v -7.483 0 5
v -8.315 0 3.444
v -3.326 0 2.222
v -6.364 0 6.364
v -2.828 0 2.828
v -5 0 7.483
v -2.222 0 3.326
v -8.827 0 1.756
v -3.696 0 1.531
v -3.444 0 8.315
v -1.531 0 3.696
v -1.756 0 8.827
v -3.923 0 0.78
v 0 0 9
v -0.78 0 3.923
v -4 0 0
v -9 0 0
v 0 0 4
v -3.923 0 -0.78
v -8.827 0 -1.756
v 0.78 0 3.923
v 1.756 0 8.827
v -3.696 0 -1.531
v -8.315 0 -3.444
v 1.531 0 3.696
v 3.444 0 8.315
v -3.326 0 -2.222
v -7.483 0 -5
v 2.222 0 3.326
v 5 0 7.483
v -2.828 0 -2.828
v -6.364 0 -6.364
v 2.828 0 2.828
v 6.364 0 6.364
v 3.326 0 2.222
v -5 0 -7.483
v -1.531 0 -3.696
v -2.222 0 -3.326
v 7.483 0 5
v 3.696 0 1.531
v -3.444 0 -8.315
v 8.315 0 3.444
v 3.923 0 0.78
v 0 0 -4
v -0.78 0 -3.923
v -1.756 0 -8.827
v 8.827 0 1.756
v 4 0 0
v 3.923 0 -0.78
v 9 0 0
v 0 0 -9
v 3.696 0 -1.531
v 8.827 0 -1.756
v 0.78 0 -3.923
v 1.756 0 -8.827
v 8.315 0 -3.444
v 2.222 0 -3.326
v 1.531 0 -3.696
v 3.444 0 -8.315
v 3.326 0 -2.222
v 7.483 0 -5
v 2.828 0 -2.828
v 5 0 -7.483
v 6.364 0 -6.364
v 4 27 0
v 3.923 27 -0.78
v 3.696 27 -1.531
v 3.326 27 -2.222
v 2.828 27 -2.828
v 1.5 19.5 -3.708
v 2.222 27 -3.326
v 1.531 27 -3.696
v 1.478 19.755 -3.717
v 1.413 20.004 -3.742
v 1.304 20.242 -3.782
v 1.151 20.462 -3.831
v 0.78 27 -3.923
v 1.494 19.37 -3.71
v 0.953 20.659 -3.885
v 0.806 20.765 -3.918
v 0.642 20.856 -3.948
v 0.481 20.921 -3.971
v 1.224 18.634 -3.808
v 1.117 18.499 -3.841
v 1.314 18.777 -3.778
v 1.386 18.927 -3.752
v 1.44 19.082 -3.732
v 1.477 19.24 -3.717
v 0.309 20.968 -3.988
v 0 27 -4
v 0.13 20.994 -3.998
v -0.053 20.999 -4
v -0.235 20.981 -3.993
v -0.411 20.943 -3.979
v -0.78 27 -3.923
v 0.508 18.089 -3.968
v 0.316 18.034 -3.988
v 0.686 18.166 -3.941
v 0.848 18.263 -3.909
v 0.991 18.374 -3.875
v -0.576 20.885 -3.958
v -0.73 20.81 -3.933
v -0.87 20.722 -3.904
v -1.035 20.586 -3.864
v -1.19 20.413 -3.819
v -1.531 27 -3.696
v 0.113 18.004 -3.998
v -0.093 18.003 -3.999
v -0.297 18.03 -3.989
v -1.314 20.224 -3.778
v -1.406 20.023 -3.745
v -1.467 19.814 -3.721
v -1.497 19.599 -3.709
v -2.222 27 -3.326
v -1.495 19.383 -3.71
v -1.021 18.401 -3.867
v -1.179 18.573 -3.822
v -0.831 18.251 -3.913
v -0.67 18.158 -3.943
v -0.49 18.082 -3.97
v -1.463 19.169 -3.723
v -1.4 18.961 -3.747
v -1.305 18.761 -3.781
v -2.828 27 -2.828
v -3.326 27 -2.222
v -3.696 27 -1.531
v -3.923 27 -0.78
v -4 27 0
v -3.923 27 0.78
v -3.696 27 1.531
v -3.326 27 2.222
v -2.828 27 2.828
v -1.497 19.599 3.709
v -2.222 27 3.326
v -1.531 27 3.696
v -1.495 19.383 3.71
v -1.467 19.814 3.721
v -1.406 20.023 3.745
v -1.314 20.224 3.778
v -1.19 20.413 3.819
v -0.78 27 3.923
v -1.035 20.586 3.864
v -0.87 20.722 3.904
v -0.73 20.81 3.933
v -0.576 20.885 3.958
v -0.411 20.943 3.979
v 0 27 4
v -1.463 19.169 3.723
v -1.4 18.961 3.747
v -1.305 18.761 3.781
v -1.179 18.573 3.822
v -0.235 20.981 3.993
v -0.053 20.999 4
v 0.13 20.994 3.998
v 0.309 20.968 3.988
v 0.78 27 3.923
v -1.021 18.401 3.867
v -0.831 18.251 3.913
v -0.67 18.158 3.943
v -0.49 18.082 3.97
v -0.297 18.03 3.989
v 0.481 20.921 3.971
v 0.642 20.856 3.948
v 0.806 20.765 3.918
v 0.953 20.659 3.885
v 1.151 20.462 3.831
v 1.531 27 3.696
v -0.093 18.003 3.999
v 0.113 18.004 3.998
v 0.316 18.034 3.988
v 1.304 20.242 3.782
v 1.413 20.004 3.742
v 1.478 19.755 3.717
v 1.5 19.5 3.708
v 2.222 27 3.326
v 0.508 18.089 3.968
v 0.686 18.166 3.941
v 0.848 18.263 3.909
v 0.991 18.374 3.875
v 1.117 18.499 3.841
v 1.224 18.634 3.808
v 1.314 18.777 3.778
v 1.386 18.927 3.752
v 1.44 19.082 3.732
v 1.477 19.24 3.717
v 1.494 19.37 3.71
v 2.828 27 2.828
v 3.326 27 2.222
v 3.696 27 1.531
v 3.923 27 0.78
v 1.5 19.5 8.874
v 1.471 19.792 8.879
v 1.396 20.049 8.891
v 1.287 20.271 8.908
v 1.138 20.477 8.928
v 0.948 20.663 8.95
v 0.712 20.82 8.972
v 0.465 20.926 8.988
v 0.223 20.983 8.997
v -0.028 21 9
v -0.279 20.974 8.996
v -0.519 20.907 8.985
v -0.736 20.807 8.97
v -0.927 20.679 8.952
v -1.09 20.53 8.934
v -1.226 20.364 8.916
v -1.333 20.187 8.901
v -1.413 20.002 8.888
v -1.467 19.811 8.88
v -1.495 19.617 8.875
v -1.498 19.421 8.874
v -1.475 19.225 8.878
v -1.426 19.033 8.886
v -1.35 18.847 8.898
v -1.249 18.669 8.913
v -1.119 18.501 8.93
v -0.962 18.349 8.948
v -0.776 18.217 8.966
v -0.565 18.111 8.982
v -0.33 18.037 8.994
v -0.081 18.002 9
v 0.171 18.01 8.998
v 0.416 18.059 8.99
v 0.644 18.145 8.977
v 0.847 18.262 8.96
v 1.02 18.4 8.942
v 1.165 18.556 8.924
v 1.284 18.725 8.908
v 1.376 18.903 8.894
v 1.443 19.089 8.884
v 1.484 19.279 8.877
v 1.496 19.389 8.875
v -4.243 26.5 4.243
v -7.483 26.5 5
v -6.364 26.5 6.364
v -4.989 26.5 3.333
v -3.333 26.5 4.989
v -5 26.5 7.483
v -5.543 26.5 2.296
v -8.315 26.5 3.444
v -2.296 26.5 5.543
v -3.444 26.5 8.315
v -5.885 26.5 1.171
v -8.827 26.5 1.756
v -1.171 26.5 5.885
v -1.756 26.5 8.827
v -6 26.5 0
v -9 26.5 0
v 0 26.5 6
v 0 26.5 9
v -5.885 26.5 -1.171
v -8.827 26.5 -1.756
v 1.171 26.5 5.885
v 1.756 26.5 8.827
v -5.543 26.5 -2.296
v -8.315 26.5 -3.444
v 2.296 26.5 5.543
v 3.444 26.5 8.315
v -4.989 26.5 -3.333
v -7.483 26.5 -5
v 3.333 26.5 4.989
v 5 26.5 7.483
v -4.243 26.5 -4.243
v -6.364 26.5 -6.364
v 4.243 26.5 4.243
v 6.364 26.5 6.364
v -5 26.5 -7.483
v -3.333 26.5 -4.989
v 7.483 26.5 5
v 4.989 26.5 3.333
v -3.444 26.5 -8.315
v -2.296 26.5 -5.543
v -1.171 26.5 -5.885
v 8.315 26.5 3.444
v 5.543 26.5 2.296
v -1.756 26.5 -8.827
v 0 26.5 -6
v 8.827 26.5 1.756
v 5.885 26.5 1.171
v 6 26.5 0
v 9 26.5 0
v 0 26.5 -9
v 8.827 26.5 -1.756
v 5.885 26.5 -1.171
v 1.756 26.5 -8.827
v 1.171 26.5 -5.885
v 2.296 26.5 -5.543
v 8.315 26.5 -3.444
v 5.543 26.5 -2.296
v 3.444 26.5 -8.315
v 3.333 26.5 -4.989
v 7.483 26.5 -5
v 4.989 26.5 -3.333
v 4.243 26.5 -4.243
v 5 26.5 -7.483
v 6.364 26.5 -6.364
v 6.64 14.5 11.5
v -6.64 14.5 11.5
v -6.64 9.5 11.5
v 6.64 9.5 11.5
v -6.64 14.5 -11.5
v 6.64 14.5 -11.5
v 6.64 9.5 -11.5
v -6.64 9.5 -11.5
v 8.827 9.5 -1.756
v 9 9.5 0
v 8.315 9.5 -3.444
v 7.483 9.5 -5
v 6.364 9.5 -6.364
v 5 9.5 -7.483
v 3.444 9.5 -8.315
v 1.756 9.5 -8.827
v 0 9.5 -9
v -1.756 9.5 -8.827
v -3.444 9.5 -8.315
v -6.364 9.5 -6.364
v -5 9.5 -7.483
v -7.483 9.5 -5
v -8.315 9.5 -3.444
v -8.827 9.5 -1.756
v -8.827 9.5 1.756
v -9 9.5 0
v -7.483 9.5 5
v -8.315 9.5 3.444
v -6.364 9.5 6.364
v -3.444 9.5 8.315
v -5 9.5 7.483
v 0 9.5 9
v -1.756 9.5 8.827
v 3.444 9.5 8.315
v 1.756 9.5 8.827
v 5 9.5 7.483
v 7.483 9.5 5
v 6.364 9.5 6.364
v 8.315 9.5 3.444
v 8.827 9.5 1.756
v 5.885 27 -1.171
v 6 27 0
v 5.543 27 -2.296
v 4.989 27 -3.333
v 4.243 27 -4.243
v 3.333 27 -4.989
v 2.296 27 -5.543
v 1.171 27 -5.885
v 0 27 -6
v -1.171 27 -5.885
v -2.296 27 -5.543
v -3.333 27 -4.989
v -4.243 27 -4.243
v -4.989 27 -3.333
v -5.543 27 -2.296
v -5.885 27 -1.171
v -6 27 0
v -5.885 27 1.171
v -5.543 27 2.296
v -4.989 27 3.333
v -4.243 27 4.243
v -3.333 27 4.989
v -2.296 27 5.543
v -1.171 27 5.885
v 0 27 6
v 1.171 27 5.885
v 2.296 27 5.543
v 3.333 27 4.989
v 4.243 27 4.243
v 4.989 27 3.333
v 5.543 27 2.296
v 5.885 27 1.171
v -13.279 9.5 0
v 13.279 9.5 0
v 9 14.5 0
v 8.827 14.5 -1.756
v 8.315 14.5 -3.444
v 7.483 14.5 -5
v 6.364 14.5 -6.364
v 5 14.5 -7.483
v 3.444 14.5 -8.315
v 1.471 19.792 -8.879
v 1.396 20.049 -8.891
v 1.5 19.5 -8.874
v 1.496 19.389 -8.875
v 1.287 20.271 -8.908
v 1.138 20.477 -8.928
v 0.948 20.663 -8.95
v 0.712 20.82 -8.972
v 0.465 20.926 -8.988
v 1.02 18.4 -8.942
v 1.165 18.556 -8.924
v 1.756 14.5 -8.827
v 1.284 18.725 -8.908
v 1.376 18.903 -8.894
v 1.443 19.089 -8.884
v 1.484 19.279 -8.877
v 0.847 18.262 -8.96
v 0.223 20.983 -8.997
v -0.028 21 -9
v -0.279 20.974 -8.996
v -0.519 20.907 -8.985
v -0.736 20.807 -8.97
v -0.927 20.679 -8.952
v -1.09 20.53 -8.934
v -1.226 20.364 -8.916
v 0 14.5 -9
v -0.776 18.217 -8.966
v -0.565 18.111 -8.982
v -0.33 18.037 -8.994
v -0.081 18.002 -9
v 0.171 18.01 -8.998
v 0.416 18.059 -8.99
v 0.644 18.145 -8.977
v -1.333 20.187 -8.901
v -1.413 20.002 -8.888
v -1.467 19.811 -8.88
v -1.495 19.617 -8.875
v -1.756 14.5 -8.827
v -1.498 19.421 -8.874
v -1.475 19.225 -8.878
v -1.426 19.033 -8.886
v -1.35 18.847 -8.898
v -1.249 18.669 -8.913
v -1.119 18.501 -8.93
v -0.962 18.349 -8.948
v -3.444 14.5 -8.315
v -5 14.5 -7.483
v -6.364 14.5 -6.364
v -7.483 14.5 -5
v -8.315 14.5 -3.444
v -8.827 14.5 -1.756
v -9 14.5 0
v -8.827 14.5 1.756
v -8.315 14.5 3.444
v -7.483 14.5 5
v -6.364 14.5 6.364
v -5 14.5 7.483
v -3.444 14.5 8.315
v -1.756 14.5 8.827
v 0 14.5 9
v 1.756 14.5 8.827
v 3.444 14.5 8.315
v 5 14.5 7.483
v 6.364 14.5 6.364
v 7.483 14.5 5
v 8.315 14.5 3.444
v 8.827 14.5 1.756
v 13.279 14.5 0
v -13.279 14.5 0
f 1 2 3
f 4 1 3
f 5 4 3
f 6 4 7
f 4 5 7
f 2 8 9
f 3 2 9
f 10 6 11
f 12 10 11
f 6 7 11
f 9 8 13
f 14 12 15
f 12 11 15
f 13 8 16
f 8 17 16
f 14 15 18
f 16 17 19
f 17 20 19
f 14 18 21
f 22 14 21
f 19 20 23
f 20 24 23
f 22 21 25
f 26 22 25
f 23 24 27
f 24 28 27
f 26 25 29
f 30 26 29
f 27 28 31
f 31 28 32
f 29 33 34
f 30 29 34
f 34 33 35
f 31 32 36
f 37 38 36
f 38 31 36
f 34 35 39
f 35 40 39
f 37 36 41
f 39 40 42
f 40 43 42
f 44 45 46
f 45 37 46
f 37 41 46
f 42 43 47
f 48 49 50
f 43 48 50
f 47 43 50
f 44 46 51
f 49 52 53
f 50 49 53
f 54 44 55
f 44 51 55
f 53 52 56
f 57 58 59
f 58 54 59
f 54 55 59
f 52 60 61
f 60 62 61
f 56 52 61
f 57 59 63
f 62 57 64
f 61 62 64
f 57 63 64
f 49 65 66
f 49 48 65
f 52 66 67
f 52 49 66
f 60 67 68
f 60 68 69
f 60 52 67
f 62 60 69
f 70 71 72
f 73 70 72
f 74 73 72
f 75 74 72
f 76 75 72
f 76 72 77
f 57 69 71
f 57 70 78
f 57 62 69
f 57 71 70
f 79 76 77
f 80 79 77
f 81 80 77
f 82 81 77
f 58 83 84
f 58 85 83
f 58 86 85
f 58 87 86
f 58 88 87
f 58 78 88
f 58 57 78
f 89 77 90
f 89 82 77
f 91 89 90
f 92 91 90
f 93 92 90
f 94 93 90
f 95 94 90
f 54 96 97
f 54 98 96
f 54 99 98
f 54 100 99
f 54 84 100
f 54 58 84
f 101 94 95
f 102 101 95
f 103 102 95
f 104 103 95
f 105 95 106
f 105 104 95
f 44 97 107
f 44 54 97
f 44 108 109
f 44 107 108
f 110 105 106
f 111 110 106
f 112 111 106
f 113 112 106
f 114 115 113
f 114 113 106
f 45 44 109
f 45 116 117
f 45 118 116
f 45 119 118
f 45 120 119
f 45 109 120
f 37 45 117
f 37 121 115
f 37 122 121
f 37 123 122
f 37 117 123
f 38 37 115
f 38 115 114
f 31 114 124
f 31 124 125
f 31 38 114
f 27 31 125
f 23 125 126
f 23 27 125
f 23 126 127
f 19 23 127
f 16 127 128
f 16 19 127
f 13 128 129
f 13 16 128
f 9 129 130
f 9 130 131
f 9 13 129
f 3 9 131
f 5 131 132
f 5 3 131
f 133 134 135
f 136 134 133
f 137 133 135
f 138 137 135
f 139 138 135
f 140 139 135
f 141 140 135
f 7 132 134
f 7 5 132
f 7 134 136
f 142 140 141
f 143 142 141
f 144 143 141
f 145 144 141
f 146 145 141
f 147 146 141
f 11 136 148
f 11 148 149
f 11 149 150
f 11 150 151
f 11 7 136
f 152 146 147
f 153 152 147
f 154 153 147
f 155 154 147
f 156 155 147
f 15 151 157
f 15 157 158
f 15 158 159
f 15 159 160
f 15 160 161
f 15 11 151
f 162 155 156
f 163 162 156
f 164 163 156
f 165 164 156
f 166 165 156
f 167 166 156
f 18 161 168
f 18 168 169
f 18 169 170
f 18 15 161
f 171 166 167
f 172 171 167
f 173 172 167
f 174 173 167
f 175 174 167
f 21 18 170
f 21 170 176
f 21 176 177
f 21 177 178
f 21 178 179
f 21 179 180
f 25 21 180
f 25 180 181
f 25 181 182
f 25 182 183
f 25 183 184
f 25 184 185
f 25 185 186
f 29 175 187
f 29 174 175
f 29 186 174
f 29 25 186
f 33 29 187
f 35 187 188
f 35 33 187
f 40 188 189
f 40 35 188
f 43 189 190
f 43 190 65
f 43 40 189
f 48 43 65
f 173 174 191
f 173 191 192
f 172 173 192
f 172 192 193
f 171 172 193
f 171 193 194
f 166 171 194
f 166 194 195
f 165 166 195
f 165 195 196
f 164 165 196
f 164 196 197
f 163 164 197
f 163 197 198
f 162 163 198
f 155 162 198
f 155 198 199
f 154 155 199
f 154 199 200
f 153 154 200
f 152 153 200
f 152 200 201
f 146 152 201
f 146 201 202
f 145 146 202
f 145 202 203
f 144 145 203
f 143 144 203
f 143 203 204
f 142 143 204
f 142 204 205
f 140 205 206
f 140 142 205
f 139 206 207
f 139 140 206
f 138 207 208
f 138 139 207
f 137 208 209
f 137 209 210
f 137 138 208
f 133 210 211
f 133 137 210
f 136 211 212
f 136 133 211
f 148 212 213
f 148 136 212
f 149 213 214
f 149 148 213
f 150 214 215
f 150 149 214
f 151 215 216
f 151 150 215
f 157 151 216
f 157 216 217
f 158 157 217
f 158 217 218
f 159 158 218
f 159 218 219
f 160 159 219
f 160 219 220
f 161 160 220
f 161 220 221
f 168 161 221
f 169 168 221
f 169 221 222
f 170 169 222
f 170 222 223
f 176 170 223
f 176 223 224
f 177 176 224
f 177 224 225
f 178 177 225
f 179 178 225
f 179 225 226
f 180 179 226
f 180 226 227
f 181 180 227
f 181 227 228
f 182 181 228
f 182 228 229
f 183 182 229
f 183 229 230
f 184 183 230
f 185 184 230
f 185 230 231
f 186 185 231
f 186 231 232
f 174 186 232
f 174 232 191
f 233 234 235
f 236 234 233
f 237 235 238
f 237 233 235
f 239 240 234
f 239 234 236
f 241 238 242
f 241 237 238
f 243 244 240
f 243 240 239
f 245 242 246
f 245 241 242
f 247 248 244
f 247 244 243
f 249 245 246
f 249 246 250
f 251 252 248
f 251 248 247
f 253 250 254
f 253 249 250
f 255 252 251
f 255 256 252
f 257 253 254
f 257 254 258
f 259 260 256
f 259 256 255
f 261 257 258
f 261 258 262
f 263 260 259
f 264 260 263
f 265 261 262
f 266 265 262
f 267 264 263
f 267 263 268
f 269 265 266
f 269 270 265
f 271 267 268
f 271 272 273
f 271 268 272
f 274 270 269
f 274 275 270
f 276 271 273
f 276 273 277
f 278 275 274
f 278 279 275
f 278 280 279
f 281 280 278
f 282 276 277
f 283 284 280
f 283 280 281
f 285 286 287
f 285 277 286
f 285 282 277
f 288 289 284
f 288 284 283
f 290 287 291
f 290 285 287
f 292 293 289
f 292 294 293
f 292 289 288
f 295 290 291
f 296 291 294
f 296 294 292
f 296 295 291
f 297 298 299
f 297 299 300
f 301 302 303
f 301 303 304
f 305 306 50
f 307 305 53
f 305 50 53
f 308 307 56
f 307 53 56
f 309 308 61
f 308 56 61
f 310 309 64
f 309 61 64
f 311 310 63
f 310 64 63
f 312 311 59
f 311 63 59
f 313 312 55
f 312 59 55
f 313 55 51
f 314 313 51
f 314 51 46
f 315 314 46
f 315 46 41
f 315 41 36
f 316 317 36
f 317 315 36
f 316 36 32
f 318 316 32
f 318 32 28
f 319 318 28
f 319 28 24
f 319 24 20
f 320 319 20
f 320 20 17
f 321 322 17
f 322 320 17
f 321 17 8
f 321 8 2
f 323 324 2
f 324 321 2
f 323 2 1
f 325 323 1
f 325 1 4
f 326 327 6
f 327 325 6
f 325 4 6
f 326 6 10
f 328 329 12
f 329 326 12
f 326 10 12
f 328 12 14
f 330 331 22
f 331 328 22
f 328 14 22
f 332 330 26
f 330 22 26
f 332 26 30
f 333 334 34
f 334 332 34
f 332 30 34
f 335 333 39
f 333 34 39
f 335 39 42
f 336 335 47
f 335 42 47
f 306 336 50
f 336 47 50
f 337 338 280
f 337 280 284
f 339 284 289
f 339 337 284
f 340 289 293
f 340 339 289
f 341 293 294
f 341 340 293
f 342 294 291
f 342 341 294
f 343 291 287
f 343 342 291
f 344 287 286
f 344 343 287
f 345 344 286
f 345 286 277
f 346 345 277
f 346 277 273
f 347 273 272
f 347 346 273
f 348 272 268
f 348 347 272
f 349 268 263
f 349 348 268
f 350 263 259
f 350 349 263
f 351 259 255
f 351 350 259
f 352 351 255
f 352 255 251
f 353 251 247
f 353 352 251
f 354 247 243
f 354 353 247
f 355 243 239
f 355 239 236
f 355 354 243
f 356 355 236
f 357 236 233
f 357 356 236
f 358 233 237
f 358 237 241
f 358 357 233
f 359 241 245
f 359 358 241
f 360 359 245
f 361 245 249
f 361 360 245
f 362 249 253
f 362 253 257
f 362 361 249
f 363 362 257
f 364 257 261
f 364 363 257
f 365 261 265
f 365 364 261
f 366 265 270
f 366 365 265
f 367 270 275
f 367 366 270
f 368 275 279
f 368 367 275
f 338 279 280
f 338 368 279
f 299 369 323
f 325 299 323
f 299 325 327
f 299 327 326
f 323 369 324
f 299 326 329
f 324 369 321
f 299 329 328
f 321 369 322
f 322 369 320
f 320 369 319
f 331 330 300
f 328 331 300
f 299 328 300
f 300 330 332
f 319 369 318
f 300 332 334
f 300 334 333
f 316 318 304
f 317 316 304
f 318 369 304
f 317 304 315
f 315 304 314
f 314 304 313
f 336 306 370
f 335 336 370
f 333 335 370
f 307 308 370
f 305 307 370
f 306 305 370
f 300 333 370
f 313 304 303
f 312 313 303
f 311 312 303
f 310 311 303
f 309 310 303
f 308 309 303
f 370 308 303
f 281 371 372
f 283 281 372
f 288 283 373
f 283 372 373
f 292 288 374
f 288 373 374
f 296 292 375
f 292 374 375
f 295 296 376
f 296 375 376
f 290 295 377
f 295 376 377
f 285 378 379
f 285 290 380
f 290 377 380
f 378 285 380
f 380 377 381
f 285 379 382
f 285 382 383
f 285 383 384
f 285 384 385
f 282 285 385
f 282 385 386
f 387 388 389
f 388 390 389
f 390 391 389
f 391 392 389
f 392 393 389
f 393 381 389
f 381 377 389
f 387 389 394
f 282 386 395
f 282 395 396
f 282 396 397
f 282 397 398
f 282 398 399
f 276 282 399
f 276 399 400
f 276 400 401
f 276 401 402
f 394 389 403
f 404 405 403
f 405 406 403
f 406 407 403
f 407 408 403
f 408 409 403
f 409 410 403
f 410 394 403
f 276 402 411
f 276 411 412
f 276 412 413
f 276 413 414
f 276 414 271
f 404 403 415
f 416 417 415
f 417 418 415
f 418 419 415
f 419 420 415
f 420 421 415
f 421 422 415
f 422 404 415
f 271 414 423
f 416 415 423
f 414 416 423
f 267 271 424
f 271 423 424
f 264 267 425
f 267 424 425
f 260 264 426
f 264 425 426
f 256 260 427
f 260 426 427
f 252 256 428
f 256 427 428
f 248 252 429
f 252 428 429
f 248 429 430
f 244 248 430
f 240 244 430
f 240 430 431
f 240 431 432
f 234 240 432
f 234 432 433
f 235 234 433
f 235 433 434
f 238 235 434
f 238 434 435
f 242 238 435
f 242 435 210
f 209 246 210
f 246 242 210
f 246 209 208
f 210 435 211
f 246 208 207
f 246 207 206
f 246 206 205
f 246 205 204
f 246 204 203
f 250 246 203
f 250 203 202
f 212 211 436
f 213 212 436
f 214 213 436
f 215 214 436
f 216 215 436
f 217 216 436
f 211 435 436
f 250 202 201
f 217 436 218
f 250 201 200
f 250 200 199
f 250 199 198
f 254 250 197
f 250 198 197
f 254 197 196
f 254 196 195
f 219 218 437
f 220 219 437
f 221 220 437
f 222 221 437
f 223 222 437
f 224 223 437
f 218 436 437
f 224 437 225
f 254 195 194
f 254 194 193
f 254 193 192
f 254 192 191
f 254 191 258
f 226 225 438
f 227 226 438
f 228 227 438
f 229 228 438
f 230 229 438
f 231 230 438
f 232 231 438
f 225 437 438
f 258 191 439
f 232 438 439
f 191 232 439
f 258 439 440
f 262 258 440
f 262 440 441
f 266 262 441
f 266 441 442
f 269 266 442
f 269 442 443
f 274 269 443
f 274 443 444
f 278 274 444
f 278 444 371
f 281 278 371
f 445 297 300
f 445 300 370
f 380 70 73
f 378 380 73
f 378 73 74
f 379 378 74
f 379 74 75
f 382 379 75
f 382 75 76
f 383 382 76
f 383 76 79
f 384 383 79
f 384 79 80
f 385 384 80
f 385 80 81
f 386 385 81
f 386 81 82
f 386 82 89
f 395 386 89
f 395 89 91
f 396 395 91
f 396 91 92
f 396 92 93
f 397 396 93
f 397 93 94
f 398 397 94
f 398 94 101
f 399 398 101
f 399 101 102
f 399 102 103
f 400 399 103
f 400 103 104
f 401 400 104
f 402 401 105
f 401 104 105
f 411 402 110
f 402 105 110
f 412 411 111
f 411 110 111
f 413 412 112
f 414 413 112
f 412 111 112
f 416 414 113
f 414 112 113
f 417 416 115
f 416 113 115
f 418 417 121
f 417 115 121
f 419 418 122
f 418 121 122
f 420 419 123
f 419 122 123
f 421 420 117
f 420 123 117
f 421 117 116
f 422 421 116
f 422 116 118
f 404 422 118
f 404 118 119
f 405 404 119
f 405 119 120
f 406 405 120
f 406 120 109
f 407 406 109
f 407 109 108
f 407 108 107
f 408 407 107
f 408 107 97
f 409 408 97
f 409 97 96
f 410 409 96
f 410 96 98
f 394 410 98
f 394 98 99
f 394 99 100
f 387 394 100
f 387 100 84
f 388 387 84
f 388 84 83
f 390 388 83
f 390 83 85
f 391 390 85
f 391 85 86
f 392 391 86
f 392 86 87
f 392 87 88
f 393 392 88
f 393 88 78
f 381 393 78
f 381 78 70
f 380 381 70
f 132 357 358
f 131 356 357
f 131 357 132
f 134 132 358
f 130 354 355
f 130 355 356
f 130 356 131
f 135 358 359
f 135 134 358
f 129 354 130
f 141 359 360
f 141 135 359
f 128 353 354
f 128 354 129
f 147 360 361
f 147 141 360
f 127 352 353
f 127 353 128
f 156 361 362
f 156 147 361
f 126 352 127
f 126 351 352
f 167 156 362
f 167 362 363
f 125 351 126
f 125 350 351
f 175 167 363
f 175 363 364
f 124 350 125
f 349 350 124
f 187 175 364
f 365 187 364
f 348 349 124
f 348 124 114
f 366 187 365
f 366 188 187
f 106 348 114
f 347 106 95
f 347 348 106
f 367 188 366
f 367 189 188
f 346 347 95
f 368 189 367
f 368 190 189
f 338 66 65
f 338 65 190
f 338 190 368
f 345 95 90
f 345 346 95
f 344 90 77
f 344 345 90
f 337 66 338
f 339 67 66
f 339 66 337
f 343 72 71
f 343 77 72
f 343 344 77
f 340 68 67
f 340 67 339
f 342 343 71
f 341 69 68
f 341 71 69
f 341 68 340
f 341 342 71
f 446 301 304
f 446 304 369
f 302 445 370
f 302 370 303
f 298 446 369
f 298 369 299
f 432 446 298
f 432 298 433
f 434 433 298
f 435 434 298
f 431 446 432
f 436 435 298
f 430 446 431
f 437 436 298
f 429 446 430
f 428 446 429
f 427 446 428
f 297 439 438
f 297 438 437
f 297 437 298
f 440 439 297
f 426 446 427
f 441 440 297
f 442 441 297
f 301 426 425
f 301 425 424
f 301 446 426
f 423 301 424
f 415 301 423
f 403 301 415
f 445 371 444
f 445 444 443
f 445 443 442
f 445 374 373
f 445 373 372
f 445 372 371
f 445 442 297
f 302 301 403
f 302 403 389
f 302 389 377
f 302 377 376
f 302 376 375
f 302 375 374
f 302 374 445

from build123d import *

# Parameters (mm, degrees)
SKETCH1_R               = 9
SKETCH1_R_2             = 4
BOSS_EXTRUDE1_DEPTH     = 27
SKETCH2_R               = 9
SKETCH2_R_2             = 6
CUT_EXTRUDE1_DEPTH      = 0.5
SKETCH3_R               = 1.5
CUT_EXTRUDE2_DEPTH      = 10
CUT_EXTRUDE2_DEPTH_BACK = 10
SKETCH4_R               = 4
BOSS_EXTRUDE2_DEPTH     = 5


with BuildPart() as part:
    # Sketch1 → Boss-Extrude1 (new body)
    with BuildSketch(Plane(origin=(0, 0, 0), x_dir=(1, 0, 0), z_dir=(0, 1, 0))):
        Circle(SKETCH1_R)
        Circle(SKETCH1_R_2, mode=Mode.SUBTRACT)
    extrude(amount=BOSS_EXTRUDE1_DEPTH)

    # Sketch2 → Cut-Extrude1 (cut)
    with BuildSketch(Plane(origin=(0, 27, 0), x_dir=(1, 0, 0), z_dir=(0, 1, 0))):
        Circle(SKETCH2_R)
        Circle(SKETCH2_R_2, mode=Mode.SUBTRACT)
    extrude(amount=-CUT_EXTRUDE1_DEPTH, mode=Mode.SUBTRACT)

    # Sketch3 → Cut-Extrude2 (cut, two sides)
    with BuildSketch(Plane.XY) as cut_extrude2_sk:
        with Locations((0, 19.5)):
            Circle(SKETCH3_R)
    extrude(amount=CUT_EXTRUDE2_DEPTH, mode=Mode.SUBTRACT)
    extrude(cut_extrude2_sk.sketch, amount=-CUT_EXTRUDE2_DEPTH_BACK, mode=Mode.SUBTRACT)

    # Sketch4 → Boss-Extrude2 (add)
    with BuildSketch(Plane(origin=(0, 14.5, 0), x_dir=(1, 0, 0), z_dir=(0, 1, 0))):
        Polygon((13.279056191, 0), (6.639528096, 11.5), (-6.639528096, 11.5), (-13.279056191, 0), (-6.639528096, -11.5), (6.639528096, -11.5), align=None)
        Circle(SKETCH4_R, mode=Mode.SUBTRACT)
    extrude(amount=-BOSS_EXTRUDE2_DEPTH)


solid = part.part
